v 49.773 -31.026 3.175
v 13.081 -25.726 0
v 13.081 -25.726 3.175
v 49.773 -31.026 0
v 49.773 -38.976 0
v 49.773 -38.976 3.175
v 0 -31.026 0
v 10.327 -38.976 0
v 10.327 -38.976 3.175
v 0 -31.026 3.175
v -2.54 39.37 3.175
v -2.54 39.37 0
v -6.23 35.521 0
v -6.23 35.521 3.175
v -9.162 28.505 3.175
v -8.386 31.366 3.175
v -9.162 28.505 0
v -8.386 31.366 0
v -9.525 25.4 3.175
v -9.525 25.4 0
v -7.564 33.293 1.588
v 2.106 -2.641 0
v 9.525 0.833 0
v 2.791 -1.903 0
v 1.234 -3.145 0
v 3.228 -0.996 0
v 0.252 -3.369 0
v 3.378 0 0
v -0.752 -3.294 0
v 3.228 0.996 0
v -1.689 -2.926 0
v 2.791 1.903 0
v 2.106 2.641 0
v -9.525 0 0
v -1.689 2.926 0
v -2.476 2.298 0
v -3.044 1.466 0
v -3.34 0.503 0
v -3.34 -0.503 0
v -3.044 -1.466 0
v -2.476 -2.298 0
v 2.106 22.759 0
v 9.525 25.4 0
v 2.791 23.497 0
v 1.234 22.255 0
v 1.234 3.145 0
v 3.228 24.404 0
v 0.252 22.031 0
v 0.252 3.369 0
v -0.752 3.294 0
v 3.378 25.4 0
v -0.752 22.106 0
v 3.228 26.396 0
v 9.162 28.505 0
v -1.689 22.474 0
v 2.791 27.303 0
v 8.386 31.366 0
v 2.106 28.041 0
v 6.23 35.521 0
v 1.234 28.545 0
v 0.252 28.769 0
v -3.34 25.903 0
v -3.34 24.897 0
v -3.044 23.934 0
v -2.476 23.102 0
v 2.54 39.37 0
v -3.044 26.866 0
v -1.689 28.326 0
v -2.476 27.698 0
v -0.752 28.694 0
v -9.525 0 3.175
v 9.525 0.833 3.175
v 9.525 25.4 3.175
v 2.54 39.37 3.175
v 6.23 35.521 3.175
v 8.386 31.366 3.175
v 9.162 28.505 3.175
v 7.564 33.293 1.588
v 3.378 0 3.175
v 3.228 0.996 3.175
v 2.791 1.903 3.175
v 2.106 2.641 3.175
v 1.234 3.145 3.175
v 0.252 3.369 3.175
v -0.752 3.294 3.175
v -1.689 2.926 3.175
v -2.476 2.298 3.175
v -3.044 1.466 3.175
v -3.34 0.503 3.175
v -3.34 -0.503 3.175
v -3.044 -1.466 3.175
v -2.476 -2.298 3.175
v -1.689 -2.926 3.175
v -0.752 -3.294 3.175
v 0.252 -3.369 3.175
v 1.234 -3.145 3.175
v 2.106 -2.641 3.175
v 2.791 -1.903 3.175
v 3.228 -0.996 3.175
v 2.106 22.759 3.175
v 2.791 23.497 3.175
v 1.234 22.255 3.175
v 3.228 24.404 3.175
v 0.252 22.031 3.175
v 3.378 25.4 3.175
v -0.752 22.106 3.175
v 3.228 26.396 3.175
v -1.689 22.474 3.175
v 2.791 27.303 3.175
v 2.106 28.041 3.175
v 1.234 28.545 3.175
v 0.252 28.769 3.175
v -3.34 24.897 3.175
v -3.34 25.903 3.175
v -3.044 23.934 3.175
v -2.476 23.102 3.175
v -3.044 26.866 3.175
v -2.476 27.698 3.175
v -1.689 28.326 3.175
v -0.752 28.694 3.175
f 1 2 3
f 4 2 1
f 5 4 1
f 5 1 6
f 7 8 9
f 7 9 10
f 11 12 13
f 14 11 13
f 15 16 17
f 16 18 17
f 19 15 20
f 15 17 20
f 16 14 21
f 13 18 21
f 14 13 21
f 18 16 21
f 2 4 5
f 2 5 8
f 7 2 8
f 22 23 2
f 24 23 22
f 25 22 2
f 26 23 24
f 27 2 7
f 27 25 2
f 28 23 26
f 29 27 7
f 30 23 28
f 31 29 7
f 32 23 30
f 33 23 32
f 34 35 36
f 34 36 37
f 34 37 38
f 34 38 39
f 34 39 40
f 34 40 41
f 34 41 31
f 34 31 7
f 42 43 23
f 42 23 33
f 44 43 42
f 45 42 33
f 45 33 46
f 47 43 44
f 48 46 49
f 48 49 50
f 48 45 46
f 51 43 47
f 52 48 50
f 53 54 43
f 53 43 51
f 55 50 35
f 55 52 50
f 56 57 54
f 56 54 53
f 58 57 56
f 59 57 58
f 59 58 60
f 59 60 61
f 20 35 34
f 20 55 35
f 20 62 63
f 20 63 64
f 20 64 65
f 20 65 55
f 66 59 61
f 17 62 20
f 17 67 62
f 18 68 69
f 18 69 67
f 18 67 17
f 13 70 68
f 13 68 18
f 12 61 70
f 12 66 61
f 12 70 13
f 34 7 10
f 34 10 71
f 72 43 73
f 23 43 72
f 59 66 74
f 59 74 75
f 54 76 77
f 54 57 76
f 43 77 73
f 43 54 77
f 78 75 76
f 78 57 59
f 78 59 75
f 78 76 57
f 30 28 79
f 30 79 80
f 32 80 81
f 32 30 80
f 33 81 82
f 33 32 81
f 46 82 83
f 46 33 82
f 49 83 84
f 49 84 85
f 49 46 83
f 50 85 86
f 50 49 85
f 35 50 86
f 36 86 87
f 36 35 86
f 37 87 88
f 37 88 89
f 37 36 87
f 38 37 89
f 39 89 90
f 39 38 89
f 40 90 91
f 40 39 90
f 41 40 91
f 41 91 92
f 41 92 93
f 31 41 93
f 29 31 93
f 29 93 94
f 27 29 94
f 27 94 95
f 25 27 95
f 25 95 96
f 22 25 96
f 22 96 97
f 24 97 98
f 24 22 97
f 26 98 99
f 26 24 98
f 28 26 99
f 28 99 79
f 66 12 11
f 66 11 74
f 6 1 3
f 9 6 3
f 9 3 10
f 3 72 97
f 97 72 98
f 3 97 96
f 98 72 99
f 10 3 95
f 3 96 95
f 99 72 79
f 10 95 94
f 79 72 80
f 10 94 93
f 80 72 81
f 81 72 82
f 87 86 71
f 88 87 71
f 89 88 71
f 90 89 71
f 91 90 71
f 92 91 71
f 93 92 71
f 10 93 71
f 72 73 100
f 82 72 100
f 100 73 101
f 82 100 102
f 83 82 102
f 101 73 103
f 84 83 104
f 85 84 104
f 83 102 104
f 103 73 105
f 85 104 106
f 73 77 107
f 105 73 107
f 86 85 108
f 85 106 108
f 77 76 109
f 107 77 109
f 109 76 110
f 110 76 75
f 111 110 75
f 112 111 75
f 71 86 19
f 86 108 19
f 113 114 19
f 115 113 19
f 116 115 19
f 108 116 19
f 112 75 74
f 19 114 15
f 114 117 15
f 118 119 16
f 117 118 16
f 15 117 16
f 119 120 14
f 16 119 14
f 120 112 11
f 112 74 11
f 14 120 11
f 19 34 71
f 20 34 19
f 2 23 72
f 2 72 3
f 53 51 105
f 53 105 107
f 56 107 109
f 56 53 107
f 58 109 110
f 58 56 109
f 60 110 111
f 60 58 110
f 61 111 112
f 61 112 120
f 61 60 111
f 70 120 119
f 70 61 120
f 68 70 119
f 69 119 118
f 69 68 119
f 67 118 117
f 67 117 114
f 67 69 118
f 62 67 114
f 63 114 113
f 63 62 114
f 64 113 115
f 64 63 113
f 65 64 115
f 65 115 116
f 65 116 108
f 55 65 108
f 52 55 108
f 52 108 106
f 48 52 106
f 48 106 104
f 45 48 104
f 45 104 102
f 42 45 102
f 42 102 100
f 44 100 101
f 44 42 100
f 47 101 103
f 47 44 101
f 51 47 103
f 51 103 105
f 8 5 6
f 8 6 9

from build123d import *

# Parameters (mm, degrees)
SKETCH1_R           = 3.3782
BOSS_EXTRUDE1_DEPTH = 3.175


with BuildPart() as part:
    # Sketch1 → Boss-Extrude1 (new body)
    with BuildSketch(Plane.XY):
        with BuildLine():
            Line((-2.54, 39.37), (2.54, 39.37))
            add(Edge.make_bspline(
                [(2.54, 39.37), (9.095418915, 34.201637521), (9.525, 25.4)],
                knots=[0, 0, 0, 1, 1, 1], degree=2))
            Line((9.525, 25.4), (9.525, 0.833077402))
            Line((9.525, 0.833077402), (13.080713372, -25.725670045))
            Line((13.080713372, -25.725670045), (49.772779476, -31.025635149))
            Line((49.772779476, -31.025635149), (49.772779476, -38.975582805))
            Line((49.772779476, -38.975582805), (10.326960053, -38.975582805))
            Line((10.326960053, -38.975582805), (0, -31.025635149))
            Line((0, -31.025635149), (-9.525, 0))
            Line((-9.525, 0), (-9.525, 25.4))
            add(Edge.make_bspline(
                [(-2.54, 39.37), (-9.095418915, 34.201637521), (-9.525, 25.4)],
                knots=[0, 0, 0, 1, 1, 1], degree=2))
        make_face()
        with Locations((0, 25.4)):
            Circle(SKETCH1_R, mode=Mode.SUBTRACT)
        Circle(SKETCH1_R, mode=Mode.SUBTRACT)
    extrude(amount=BOSS_EXTRUDE1_DEPTH)


solid = part.part
